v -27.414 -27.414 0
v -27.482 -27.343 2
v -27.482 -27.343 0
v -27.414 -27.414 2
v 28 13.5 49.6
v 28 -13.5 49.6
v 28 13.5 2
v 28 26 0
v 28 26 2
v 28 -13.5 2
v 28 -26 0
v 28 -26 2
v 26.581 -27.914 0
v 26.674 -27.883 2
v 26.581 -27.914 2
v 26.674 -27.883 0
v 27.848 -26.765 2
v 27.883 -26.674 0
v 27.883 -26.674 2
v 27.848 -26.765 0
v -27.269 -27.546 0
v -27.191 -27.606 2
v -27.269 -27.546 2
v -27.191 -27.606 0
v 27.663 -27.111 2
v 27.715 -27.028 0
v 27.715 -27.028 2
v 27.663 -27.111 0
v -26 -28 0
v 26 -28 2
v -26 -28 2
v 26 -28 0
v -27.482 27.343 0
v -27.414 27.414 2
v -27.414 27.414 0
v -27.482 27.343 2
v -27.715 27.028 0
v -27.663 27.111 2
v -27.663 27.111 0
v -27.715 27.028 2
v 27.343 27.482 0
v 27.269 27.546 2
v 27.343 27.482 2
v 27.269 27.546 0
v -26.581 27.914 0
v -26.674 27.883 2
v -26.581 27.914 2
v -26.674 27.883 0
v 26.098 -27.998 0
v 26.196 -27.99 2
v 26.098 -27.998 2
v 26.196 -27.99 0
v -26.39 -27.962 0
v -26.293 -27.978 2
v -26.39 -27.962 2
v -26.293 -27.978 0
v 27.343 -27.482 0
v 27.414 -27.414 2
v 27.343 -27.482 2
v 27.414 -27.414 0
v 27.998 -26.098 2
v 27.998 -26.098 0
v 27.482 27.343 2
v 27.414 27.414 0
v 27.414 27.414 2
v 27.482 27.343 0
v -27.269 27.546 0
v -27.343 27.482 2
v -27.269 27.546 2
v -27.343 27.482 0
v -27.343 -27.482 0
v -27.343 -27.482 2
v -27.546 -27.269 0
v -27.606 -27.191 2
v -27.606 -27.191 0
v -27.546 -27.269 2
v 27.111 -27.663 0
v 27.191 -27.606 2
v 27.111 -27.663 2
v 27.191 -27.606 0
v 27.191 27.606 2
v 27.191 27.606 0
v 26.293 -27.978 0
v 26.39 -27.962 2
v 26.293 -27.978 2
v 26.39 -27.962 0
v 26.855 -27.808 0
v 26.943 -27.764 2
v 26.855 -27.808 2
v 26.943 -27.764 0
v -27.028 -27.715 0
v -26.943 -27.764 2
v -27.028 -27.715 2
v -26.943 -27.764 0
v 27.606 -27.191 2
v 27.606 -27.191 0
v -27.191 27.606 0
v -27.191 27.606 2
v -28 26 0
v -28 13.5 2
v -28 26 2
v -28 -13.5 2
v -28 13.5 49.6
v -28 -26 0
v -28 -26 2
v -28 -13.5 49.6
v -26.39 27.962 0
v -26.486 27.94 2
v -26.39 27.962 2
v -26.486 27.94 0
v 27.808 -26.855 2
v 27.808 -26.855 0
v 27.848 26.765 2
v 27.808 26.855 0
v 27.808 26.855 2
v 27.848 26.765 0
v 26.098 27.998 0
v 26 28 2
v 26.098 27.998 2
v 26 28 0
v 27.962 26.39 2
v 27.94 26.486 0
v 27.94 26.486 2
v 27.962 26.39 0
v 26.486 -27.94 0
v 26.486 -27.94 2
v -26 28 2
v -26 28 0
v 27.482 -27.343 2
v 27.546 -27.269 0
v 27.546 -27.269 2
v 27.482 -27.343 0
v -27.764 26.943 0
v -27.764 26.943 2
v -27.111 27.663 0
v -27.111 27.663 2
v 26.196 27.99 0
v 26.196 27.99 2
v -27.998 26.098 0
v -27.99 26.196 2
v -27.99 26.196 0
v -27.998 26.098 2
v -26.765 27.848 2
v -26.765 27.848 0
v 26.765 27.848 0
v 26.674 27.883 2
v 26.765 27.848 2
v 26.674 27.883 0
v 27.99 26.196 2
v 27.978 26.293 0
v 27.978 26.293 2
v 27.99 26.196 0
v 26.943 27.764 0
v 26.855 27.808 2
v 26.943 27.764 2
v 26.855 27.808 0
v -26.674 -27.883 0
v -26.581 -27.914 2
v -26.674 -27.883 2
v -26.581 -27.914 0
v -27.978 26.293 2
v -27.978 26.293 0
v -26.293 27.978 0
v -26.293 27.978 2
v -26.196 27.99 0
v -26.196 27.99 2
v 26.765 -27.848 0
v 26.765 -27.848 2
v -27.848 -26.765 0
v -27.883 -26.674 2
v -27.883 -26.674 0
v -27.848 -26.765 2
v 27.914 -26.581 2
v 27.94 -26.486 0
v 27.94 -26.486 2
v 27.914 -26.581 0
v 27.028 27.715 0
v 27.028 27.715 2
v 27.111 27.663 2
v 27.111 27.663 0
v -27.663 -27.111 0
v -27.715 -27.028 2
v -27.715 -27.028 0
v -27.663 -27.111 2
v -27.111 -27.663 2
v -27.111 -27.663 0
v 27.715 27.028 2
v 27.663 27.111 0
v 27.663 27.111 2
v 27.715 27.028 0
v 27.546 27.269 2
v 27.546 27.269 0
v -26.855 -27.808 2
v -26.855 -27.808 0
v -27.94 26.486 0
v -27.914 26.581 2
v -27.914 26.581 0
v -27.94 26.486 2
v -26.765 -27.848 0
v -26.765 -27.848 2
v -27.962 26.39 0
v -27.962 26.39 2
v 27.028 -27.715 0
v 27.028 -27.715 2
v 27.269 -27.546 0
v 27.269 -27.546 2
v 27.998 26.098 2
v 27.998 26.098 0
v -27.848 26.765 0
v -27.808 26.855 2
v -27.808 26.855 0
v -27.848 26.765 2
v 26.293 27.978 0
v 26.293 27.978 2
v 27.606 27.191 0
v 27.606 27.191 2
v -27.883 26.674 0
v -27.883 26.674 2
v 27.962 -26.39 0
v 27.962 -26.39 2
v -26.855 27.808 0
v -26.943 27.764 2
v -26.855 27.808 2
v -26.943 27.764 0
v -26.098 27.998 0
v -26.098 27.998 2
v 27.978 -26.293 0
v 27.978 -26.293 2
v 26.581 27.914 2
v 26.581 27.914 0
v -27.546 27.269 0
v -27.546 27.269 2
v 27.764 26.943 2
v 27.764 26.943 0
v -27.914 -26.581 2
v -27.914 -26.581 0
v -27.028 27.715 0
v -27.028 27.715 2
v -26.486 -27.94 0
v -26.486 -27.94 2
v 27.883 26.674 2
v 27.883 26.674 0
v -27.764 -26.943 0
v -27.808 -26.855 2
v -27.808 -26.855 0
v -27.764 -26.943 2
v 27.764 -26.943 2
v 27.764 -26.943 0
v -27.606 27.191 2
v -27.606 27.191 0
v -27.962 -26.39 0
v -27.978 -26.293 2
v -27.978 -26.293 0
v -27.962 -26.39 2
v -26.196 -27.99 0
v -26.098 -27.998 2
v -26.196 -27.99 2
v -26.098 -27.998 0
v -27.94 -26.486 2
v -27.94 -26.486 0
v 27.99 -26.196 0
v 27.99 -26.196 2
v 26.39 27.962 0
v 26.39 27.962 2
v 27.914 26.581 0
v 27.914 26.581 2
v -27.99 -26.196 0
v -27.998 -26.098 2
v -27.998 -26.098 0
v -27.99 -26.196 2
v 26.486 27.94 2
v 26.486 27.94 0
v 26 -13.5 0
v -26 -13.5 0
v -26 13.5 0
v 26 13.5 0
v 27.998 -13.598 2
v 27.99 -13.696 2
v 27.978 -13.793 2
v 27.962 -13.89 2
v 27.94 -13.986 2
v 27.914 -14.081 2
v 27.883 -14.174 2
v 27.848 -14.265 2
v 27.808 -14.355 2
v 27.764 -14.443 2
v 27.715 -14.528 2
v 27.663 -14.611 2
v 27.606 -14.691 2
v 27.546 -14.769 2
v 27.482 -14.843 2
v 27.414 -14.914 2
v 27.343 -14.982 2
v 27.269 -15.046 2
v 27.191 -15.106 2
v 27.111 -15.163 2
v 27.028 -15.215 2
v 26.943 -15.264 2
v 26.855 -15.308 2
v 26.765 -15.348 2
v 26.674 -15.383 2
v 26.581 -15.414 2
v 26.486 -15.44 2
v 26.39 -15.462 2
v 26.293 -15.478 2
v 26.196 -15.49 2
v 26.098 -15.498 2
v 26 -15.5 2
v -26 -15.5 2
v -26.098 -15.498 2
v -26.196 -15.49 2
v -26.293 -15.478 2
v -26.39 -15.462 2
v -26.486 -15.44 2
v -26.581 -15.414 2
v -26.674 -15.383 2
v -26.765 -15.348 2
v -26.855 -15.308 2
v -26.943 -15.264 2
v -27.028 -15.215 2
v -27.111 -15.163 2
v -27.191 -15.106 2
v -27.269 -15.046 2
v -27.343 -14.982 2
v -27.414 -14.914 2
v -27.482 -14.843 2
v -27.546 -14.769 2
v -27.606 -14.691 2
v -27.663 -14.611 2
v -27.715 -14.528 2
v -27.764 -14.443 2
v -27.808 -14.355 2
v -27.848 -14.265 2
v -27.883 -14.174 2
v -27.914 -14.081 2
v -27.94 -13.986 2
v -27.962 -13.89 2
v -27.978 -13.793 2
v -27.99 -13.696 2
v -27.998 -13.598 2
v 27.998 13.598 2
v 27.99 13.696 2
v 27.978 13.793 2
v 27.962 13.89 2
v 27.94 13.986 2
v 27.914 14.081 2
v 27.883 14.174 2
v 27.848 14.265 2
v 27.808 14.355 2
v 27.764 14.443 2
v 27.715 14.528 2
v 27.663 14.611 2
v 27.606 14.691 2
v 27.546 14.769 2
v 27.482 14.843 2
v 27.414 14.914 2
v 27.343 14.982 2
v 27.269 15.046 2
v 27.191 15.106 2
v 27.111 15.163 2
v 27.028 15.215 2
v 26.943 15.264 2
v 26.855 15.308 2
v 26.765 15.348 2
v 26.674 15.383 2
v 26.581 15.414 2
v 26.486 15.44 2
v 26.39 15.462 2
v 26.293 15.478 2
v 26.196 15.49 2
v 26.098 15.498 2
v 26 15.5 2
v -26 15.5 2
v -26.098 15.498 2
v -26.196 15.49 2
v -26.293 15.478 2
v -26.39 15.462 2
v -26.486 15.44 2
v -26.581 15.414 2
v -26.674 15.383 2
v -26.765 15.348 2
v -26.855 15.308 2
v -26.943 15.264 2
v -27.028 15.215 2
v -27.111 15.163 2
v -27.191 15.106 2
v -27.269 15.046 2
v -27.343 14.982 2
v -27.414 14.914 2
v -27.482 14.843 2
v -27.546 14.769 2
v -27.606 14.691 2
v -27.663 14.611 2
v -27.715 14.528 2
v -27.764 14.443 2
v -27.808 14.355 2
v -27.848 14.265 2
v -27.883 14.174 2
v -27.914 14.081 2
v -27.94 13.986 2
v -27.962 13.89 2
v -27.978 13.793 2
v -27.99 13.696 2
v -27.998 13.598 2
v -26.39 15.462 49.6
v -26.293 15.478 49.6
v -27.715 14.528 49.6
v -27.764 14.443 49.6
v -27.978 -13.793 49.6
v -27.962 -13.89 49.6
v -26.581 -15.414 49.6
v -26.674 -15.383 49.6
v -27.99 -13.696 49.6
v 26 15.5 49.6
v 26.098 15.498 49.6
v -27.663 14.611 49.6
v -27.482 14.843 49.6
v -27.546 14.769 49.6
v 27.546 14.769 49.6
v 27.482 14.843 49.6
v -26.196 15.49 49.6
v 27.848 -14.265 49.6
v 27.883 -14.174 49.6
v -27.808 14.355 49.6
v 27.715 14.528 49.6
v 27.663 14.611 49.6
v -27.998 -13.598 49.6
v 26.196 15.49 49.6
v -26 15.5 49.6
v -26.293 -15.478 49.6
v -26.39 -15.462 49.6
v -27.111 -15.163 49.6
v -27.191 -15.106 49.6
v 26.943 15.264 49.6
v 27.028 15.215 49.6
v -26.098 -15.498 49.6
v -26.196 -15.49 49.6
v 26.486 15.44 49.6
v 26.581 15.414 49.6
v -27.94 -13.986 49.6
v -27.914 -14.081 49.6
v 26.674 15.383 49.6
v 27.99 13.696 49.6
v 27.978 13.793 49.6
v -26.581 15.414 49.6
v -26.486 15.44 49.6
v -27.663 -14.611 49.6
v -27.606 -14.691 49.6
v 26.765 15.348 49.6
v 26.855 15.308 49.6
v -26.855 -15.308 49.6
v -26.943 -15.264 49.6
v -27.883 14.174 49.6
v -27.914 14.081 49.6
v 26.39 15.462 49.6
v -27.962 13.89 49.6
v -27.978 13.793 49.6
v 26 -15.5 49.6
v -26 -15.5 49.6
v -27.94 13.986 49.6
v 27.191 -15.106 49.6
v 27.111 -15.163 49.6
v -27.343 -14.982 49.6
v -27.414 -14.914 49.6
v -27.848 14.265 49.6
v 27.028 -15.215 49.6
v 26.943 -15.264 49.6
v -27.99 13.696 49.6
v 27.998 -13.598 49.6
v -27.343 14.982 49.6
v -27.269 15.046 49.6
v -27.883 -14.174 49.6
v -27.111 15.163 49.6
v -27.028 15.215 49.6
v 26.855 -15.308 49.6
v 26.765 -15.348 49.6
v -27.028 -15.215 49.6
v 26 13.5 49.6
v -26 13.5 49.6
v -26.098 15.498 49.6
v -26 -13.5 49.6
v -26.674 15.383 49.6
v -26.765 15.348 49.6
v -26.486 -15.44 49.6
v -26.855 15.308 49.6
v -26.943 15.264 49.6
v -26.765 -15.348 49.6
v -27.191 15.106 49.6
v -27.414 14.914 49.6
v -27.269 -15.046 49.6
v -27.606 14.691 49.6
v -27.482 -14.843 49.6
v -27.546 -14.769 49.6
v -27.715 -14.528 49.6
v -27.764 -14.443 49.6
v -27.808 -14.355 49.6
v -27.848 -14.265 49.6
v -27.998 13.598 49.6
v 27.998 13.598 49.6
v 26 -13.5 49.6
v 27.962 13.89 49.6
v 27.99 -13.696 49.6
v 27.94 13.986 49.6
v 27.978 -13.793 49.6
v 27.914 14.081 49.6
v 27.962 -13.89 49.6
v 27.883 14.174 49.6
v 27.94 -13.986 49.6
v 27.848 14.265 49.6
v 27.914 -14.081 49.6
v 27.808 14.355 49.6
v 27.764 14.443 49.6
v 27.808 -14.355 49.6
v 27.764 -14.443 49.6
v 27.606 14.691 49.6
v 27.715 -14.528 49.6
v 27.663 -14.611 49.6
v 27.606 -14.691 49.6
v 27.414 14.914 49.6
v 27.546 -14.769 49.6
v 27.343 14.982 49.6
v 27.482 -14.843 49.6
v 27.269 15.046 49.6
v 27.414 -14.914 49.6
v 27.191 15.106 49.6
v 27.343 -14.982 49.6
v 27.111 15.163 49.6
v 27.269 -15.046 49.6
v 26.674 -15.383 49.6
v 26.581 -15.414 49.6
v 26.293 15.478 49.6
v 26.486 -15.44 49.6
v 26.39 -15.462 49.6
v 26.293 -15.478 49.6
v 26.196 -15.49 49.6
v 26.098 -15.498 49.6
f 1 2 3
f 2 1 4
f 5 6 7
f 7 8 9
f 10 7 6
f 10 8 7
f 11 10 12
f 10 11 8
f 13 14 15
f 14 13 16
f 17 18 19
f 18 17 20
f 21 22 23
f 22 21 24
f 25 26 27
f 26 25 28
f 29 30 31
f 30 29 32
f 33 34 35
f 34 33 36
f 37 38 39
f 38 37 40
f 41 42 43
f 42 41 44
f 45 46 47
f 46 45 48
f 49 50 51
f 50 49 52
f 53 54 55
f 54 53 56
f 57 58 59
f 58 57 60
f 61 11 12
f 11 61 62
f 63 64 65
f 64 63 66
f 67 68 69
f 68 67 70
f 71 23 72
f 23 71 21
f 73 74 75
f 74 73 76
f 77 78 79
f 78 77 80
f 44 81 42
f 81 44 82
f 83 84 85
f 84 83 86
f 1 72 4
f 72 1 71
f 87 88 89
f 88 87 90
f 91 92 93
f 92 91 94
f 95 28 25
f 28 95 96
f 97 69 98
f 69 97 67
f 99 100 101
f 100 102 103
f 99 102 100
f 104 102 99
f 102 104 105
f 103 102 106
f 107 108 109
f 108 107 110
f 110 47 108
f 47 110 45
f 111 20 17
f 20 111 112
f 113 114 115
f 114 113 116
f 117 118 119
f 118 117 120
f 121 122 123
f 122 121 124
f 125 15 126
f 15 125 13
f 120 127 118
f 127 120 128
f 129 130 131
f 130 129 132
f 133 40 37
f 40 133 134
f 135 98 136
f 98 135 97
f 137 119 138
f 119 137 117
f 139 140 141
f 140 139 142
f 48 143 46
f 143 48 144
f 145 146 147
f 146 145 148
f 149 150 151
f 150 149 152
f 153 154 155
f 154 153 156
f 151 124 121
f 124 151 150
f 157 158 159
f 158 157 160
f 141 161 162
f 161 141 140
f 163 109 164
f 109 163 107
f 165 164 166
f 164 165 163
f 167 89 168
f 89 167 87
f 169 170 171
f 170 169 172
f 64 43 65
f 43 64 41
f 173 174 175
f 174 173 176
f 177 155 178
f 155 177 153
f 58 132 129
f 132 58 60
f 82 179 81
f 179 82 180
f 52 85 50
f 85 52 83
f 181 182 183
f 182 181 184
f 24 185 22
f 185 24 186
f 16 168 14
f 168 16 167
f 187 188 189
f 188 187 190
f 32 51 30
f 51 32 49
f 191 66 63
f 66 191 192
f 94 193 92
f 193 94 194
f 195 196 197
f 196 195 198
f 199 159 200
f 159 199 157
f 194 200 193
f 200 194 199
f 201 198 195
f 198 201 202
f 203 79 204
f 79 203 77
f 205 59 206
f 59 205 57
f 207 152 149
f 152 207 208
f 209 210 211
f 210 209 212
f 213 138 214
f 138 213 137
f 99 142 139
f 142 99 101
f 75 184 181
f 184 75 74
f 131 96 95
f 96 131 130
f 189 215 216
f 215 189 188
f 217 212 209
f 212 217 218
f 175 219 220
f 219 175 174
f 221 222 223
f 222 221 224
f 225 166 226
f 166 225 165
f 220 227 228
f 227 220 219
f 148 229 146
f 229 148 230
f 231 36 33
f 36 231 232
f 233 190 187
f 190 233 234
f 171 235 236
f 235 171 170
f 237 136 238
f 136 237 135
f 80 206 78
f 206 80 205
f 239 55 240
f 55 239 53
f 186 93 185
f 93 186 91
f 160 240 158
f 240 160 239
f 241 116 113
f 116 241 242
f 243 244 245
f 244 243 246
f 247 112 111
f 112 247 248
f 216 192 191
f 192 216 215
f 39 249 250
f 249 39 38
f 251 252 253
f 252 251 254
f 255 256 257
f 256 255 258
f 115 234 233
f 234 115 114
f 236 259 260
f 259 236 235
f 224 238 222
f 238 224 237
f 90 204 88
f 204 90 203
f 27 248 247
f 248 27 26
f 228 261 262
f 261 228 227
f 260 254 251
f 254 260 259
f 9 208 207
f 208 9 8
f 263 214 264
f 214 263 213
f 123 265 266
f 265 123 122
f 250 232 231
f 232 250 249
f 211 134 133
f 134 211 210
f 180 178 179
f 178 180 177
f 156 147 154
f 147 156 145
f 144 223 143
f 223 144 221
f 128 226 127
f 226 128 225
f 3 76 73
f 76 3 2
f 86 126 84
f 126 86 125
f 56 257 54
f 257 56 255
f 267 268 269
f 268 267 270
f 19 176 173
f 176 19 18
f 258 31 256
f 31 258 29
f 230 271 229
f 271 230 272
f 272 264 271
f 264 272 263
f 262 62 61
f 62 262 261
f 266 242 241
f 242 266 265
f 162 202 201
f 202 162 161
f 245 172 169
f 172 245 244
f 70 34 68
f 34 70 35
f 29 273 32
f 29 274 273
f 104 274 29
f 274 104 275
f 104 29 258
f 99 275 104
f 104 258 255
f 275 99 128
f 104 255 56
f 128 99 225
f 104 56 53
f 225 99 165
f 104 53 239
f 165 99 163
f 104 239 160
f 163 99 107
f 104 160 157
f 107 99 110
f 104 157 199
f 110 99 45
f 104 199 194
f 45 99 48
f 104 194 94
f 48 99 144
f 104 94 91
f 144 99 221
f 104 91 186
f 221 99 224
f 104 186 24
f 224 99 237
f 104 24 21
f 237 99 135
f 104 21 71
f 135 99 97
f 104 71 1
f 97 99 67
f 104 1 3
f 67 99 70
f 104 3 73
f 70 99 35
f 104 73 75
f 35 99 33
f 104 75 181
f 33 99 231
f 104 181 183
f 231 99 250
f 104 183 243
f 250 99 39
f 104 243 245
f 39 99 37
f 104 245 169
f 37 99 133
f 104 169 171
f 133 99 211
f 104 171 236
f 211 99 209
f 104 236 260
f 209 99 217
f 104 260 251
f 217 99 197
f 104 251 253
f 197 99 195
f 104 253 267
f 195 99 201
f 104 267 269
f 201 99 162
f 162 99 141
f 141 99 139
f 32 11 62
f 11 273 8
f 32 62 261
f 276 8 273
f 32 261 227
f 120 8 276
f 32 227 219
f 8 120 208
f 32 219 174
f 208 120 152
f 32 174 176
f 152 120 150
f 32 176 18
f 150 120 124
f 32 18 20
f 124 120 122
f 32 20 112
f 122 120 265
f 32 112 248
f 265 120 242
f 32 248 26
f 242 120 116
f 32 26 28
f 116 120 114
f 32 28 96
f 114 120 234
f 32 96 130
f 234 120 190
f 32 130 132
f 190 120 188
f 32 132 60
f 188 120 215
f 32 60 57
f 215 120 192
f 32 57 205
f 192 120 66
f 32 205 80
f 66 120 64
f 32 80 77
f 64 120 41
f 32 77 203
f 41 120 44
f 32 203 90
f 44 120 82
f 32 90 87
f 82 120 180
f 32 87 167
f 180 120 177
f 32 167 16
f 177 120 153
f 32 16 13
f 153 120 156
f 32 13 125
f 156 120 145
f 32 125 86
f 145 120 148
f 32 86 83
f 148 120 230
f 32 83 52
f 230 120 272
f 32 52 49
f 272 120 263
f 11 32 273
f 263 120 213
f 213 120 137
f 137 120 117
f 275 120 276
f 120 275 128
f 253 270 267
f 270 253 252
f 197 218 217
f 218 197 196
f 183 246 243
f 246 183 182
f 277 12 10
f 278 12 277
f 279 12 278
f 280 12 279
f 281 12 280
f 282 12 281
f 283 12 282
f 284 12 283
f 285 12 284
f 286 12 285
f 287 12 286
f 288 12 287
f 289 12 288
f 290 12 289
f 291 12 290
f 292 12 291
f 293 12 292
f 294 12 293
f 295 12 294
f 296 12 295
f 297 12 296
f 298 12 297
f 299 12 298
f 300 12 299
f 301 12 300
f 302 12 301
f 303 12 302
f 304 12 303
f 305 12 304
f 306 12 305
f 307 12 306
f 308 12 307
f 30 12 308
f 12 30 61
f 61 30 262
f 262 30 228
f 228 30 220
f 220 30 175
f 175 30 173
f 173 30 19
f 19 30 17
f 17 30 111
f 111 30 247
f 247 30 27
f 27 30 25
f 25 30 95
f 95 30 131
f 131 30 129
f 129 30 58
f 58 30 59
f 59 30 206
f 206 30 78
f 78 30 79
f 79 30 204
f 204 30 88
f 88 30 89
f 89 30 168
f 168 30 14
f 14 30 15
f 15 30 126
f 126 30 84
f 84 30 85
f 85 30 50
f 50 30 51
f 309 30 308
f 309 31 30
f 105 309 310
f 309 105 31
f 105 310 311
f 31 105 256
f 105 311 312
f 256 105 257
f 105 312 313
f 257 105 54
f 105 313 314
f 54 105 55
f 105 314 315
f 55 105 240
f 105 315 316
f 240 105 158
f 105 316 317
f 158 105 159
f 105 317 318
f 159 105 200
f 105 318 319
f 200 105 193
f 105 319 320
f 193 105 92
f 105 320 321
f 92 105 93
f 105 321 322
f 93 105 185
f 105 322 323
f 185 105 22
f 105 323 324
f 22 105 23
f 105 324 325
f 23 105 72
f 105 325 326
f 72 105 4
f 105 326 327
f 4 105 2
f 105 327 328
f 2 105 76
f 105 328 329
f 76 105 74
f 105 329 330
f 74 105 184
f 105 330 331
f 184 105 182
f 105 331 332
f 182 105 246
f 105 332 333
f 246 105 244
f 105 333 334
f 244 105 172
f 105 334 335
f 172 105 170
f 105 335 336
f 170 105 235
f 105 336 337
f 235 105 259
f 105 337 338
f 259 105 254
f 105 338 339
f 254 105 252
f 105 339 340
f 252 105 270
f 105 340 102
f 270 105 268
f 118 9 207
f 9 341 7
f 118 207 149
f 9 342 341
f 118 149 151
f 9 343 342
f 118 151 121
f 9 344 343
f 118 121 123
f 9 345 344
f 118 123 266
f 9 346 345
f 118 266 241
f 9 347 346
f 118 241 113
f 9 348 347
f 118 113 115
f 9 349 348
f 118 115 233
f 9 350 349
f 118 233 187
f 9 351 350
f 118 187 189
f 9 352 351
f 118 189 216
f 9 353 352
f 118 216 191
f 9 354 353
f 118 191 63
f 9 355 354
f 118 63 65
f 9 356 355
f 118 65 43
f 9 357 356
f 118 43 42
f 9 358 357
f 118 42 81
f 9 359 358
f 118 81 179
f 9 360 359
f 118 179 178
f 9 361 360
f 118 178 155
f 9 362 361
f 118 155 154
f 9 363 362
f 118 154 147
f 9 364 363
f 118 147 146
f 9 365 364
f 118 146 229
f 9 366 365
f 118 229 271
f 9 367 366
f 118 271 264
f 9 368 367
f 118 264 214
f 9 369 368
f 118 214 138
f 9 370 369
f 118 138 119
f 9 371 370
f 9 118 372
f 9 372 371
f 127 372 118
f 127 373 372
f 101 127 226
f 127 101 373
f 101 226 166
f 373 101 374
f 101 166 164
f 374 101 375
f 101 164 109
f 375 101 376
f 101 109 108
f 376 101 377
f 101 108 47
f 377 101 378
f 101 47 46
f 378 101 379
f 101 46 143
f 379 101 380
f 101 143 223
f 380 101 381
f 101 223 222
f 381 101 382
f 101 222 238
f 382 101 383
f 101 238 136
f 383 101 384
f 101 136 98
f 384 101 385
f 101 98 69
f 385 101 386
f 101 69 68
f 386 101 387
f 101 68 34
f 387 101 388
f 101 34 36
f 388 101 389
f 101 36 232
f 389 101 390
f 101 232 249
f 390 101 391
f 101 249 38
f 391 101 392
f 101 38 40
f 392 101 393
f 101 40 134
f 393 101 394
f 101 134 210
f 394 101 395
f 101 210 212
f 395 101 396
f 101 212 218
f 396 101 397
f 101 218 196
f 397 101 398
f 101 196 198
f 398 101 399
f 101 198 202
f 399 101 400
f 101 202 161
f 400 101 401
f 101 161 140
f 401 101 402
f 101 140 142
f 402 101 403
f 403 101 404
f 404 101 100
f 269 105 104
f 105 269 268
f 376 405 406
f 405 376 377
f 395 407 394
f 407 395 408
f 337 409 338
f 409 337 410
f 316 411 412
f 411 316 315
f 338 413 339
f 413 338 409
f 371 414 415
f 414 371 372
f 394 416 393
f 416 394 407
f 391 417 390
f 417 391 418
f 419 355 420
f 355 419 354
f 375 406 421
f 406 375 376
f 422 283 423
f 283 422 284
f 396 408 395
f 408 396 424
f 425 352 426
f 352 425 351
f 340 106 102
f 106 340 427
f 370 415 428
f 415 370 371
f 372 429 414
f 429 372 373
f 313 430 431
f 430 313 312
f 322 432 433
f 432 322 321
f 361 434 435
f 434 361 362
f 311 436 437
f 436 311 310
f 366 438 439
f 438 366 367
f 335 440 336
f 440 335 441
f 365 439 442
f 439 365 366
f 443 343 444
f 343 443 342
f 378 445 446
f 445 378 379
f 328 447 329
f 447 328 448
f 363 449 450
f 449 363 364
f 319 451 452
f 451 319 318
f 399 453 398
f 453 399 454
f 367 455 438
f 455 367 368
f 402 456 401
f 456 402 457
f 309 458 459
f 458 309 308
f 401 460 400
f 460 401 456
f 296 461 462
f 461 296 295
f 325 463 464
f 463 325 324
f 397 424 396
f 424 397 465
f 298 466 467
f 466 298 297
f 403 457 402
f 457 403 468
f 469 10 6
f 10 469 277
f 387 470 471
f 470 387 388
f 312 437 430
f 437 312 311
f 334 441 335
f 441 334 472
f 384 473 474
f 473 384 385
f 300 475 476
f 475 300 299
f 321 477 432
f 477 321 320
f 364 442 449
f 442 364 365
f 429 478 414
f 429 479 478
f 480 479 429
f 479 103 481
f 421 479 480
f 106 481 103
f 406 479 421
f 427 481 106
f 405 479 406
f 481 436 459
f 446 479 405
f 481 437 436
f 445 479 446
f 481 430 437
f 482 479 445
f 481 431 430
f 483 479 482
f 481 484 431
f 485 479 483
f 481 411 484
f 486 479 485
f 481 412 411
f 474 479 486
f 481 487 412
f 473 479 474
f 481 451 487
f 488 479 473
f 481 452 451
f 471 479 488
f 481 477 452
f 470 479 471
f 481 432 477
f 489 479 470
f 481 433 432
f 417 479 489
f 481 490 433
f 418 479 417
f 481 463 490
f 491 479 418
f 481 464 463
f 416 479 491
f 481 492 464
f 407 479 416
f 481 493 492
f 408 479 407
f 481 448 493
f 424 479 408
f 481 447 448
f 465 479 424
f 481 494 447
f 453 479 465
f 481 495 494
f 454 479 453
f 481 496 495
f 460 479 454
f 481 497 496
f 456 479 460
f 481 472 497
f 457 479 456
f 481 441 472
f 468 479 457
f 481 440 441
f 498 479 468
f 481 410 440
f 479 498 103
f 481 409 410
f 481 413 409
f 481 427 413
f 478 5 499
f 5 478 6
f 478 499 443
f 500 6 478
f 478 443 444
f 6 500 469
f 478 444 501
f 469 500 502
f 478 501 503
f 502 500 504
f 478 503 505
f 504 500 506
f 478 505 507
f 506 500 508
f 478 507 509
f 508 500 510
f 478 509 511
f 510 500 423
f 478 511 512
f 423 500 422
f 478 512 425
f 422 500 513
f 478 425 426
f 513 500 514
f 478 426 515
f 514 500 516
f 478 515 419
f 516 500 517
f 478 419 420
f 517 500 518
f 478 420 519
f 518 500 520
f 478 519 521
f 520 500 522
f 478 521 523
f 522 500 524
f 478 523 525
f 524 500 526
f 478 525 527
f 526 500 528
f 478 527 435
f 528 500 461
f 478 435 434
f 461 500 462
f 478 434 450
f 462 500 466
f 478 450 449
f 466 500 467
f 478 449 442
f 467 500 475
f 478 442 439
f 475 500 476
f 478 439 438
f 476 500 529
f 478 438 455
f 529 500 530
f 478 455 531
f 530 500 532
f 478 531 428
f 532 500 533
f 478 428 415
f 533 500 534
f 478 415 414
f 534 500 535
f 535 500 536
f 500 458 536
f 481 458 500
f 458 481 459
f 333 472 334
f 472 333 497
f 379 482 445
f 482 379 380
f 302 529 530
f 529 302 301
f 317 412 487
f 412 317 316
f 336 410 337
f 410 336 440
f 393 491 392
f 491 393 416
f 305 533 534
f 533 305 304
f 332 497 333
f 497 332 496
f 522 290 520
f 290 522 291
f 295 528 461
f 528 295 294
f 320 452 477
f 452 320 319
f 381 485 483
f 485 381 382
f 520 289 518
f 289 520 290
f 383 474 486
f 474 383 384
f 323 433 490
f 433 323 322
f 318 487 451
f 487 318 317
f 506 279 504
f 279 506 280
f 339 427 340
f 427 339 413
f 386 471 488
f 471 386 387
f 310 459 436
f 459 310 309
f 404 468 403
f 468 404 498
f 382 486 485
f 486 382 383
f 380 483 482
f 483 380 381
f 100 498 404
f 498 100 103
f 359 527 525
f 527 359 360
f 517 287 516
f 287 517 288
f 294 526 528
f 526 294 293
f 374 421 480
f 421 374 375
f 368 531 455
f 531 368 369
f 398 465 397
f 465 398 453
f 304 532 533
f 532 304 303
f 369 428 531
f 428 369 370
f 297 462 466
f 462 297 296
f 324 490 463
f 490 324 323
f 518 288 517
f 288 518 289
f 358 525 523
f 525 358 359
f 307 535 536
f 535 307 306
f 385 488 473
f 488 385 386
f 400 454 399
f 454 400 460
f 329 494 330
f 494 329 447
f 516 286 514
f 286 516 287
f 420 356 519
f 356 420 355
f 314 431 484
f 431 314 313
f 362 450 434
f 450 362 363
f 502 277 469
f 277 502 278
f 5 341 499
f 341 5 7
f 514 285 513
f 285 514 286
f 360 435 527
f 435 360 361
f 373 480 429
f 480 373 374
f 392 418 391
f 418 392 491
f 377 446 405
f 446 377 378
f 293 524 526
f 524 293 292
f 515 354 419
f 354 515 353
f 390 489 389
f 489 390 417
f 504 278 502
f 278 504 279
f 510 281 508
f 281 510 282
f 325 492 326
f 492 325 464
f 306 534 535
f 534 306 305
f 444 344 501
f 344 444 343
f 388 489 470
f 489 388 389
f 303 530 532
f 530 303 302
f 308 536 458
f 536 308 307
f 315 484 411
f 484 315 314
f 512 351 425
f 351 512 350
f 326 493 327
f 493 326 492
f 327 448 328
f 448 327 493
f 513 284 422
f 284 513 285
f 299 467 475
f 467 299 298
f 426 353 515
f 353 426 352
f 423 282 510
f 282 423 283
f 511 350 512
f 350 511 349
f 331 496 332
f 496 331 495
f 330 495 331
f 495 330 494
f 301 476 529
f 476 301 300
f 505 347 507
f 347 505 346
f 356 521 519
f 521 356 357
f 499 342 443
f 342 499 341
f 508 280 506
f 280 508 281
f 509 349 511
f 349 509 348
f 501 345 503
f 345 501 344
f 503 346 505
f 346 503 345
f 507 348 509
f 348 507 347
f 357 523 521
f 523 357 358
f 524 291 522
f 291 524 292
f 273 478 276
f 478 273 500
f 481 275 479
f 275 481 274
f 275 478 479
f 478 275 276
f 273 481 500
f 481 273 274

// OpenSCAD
$fn=128;
heightOfBlock=62;
widthOfBlock=51;
thicknessOfBlock=26;

holeWidth=widthOfBlock+1;
holeThickness=thicknessOfBlock+1;

totalHeight=0.8*heightOfBlock;
wallThickness=2;
outerRectangleWidth=holeWidth+2*wallThickness;
outerRectangleThickness=holeThickness+2*wallThickness;
circleRadius=sqrt(pow(outerRectangleWidth/2,2) + pow(outerRectangleThickness/2,2));
echo("circleRadius=", circleRadius);

//difference() {
//  union() {
//    translate([-outerRectangleWidth/2, -outerRectangleThickness/2, 0]) cube([outerRectangleWidth, outerRectangleThickness, totalHeight]);
    //cylinder(r=circleRadius, h=2);
//  }
//  translate([-holeWidth/2, -holeThickness/2, -5]) cube([holeWidth, holeThickness, totalHeight+10]);
//}

curvature=2;
totalYBottomSupport=outerRectangleWidth;
totalXBottomSupport=outerRectangleWidth;
totalZBottomSupport=2;

difference() {
  union() {
    hull() {
        translate([totalXBottomSupport/2-curvature, totalYBottomSupport/2-curvature, 0]) cylinder(h=totalZBottomSupport, r=curvature);
        translate([-(totalXBottomSupport/2-curvature), totalYBottomSupport/2-curvature, 0]) cylinder(h=totalZBottomSupport, r=curvature);
        translate([-(totalXBottomSupport/2-curvature), -(totalYBottomSupport/2-curvature), 0]) cylinder(h=totalZBottomSupport, r=curvature);
        translate([totalXBottomSupport/2-curvature, -(totalYBottomSupport/2-curvature), 0]) cylinder(h=totalZBottomSupport, r=curvature);
    }
    hull() {
        translate([outerRectangleWidth/2-curvature, outerRectangleThickness/2-curvature,0]) cylinder(r=curvature, h=totalHeight);
        translate([-(outerRectangleWidth/2-curvature), outerRectangleThickness/2-curvature,0]) cylinder(r=curvature, h=totalHeight);
        translate([-(outerRectangleWidth/2-curvature), -(outerRectangleThickness/2-curvature),0]) cylinder(r=curvature, h=totalHeight);
        translate([outerRectangleWidth/2-curvature, -(outerRectangleThickness/2-curvature),0]) cylinder(r=curvature, h=totalHeight);
    }
  }
   translate([-holeWidth/2, -holeThickness/2, -5]) cube([holeWidth, holeThickness, totalHeight+10]);
}
